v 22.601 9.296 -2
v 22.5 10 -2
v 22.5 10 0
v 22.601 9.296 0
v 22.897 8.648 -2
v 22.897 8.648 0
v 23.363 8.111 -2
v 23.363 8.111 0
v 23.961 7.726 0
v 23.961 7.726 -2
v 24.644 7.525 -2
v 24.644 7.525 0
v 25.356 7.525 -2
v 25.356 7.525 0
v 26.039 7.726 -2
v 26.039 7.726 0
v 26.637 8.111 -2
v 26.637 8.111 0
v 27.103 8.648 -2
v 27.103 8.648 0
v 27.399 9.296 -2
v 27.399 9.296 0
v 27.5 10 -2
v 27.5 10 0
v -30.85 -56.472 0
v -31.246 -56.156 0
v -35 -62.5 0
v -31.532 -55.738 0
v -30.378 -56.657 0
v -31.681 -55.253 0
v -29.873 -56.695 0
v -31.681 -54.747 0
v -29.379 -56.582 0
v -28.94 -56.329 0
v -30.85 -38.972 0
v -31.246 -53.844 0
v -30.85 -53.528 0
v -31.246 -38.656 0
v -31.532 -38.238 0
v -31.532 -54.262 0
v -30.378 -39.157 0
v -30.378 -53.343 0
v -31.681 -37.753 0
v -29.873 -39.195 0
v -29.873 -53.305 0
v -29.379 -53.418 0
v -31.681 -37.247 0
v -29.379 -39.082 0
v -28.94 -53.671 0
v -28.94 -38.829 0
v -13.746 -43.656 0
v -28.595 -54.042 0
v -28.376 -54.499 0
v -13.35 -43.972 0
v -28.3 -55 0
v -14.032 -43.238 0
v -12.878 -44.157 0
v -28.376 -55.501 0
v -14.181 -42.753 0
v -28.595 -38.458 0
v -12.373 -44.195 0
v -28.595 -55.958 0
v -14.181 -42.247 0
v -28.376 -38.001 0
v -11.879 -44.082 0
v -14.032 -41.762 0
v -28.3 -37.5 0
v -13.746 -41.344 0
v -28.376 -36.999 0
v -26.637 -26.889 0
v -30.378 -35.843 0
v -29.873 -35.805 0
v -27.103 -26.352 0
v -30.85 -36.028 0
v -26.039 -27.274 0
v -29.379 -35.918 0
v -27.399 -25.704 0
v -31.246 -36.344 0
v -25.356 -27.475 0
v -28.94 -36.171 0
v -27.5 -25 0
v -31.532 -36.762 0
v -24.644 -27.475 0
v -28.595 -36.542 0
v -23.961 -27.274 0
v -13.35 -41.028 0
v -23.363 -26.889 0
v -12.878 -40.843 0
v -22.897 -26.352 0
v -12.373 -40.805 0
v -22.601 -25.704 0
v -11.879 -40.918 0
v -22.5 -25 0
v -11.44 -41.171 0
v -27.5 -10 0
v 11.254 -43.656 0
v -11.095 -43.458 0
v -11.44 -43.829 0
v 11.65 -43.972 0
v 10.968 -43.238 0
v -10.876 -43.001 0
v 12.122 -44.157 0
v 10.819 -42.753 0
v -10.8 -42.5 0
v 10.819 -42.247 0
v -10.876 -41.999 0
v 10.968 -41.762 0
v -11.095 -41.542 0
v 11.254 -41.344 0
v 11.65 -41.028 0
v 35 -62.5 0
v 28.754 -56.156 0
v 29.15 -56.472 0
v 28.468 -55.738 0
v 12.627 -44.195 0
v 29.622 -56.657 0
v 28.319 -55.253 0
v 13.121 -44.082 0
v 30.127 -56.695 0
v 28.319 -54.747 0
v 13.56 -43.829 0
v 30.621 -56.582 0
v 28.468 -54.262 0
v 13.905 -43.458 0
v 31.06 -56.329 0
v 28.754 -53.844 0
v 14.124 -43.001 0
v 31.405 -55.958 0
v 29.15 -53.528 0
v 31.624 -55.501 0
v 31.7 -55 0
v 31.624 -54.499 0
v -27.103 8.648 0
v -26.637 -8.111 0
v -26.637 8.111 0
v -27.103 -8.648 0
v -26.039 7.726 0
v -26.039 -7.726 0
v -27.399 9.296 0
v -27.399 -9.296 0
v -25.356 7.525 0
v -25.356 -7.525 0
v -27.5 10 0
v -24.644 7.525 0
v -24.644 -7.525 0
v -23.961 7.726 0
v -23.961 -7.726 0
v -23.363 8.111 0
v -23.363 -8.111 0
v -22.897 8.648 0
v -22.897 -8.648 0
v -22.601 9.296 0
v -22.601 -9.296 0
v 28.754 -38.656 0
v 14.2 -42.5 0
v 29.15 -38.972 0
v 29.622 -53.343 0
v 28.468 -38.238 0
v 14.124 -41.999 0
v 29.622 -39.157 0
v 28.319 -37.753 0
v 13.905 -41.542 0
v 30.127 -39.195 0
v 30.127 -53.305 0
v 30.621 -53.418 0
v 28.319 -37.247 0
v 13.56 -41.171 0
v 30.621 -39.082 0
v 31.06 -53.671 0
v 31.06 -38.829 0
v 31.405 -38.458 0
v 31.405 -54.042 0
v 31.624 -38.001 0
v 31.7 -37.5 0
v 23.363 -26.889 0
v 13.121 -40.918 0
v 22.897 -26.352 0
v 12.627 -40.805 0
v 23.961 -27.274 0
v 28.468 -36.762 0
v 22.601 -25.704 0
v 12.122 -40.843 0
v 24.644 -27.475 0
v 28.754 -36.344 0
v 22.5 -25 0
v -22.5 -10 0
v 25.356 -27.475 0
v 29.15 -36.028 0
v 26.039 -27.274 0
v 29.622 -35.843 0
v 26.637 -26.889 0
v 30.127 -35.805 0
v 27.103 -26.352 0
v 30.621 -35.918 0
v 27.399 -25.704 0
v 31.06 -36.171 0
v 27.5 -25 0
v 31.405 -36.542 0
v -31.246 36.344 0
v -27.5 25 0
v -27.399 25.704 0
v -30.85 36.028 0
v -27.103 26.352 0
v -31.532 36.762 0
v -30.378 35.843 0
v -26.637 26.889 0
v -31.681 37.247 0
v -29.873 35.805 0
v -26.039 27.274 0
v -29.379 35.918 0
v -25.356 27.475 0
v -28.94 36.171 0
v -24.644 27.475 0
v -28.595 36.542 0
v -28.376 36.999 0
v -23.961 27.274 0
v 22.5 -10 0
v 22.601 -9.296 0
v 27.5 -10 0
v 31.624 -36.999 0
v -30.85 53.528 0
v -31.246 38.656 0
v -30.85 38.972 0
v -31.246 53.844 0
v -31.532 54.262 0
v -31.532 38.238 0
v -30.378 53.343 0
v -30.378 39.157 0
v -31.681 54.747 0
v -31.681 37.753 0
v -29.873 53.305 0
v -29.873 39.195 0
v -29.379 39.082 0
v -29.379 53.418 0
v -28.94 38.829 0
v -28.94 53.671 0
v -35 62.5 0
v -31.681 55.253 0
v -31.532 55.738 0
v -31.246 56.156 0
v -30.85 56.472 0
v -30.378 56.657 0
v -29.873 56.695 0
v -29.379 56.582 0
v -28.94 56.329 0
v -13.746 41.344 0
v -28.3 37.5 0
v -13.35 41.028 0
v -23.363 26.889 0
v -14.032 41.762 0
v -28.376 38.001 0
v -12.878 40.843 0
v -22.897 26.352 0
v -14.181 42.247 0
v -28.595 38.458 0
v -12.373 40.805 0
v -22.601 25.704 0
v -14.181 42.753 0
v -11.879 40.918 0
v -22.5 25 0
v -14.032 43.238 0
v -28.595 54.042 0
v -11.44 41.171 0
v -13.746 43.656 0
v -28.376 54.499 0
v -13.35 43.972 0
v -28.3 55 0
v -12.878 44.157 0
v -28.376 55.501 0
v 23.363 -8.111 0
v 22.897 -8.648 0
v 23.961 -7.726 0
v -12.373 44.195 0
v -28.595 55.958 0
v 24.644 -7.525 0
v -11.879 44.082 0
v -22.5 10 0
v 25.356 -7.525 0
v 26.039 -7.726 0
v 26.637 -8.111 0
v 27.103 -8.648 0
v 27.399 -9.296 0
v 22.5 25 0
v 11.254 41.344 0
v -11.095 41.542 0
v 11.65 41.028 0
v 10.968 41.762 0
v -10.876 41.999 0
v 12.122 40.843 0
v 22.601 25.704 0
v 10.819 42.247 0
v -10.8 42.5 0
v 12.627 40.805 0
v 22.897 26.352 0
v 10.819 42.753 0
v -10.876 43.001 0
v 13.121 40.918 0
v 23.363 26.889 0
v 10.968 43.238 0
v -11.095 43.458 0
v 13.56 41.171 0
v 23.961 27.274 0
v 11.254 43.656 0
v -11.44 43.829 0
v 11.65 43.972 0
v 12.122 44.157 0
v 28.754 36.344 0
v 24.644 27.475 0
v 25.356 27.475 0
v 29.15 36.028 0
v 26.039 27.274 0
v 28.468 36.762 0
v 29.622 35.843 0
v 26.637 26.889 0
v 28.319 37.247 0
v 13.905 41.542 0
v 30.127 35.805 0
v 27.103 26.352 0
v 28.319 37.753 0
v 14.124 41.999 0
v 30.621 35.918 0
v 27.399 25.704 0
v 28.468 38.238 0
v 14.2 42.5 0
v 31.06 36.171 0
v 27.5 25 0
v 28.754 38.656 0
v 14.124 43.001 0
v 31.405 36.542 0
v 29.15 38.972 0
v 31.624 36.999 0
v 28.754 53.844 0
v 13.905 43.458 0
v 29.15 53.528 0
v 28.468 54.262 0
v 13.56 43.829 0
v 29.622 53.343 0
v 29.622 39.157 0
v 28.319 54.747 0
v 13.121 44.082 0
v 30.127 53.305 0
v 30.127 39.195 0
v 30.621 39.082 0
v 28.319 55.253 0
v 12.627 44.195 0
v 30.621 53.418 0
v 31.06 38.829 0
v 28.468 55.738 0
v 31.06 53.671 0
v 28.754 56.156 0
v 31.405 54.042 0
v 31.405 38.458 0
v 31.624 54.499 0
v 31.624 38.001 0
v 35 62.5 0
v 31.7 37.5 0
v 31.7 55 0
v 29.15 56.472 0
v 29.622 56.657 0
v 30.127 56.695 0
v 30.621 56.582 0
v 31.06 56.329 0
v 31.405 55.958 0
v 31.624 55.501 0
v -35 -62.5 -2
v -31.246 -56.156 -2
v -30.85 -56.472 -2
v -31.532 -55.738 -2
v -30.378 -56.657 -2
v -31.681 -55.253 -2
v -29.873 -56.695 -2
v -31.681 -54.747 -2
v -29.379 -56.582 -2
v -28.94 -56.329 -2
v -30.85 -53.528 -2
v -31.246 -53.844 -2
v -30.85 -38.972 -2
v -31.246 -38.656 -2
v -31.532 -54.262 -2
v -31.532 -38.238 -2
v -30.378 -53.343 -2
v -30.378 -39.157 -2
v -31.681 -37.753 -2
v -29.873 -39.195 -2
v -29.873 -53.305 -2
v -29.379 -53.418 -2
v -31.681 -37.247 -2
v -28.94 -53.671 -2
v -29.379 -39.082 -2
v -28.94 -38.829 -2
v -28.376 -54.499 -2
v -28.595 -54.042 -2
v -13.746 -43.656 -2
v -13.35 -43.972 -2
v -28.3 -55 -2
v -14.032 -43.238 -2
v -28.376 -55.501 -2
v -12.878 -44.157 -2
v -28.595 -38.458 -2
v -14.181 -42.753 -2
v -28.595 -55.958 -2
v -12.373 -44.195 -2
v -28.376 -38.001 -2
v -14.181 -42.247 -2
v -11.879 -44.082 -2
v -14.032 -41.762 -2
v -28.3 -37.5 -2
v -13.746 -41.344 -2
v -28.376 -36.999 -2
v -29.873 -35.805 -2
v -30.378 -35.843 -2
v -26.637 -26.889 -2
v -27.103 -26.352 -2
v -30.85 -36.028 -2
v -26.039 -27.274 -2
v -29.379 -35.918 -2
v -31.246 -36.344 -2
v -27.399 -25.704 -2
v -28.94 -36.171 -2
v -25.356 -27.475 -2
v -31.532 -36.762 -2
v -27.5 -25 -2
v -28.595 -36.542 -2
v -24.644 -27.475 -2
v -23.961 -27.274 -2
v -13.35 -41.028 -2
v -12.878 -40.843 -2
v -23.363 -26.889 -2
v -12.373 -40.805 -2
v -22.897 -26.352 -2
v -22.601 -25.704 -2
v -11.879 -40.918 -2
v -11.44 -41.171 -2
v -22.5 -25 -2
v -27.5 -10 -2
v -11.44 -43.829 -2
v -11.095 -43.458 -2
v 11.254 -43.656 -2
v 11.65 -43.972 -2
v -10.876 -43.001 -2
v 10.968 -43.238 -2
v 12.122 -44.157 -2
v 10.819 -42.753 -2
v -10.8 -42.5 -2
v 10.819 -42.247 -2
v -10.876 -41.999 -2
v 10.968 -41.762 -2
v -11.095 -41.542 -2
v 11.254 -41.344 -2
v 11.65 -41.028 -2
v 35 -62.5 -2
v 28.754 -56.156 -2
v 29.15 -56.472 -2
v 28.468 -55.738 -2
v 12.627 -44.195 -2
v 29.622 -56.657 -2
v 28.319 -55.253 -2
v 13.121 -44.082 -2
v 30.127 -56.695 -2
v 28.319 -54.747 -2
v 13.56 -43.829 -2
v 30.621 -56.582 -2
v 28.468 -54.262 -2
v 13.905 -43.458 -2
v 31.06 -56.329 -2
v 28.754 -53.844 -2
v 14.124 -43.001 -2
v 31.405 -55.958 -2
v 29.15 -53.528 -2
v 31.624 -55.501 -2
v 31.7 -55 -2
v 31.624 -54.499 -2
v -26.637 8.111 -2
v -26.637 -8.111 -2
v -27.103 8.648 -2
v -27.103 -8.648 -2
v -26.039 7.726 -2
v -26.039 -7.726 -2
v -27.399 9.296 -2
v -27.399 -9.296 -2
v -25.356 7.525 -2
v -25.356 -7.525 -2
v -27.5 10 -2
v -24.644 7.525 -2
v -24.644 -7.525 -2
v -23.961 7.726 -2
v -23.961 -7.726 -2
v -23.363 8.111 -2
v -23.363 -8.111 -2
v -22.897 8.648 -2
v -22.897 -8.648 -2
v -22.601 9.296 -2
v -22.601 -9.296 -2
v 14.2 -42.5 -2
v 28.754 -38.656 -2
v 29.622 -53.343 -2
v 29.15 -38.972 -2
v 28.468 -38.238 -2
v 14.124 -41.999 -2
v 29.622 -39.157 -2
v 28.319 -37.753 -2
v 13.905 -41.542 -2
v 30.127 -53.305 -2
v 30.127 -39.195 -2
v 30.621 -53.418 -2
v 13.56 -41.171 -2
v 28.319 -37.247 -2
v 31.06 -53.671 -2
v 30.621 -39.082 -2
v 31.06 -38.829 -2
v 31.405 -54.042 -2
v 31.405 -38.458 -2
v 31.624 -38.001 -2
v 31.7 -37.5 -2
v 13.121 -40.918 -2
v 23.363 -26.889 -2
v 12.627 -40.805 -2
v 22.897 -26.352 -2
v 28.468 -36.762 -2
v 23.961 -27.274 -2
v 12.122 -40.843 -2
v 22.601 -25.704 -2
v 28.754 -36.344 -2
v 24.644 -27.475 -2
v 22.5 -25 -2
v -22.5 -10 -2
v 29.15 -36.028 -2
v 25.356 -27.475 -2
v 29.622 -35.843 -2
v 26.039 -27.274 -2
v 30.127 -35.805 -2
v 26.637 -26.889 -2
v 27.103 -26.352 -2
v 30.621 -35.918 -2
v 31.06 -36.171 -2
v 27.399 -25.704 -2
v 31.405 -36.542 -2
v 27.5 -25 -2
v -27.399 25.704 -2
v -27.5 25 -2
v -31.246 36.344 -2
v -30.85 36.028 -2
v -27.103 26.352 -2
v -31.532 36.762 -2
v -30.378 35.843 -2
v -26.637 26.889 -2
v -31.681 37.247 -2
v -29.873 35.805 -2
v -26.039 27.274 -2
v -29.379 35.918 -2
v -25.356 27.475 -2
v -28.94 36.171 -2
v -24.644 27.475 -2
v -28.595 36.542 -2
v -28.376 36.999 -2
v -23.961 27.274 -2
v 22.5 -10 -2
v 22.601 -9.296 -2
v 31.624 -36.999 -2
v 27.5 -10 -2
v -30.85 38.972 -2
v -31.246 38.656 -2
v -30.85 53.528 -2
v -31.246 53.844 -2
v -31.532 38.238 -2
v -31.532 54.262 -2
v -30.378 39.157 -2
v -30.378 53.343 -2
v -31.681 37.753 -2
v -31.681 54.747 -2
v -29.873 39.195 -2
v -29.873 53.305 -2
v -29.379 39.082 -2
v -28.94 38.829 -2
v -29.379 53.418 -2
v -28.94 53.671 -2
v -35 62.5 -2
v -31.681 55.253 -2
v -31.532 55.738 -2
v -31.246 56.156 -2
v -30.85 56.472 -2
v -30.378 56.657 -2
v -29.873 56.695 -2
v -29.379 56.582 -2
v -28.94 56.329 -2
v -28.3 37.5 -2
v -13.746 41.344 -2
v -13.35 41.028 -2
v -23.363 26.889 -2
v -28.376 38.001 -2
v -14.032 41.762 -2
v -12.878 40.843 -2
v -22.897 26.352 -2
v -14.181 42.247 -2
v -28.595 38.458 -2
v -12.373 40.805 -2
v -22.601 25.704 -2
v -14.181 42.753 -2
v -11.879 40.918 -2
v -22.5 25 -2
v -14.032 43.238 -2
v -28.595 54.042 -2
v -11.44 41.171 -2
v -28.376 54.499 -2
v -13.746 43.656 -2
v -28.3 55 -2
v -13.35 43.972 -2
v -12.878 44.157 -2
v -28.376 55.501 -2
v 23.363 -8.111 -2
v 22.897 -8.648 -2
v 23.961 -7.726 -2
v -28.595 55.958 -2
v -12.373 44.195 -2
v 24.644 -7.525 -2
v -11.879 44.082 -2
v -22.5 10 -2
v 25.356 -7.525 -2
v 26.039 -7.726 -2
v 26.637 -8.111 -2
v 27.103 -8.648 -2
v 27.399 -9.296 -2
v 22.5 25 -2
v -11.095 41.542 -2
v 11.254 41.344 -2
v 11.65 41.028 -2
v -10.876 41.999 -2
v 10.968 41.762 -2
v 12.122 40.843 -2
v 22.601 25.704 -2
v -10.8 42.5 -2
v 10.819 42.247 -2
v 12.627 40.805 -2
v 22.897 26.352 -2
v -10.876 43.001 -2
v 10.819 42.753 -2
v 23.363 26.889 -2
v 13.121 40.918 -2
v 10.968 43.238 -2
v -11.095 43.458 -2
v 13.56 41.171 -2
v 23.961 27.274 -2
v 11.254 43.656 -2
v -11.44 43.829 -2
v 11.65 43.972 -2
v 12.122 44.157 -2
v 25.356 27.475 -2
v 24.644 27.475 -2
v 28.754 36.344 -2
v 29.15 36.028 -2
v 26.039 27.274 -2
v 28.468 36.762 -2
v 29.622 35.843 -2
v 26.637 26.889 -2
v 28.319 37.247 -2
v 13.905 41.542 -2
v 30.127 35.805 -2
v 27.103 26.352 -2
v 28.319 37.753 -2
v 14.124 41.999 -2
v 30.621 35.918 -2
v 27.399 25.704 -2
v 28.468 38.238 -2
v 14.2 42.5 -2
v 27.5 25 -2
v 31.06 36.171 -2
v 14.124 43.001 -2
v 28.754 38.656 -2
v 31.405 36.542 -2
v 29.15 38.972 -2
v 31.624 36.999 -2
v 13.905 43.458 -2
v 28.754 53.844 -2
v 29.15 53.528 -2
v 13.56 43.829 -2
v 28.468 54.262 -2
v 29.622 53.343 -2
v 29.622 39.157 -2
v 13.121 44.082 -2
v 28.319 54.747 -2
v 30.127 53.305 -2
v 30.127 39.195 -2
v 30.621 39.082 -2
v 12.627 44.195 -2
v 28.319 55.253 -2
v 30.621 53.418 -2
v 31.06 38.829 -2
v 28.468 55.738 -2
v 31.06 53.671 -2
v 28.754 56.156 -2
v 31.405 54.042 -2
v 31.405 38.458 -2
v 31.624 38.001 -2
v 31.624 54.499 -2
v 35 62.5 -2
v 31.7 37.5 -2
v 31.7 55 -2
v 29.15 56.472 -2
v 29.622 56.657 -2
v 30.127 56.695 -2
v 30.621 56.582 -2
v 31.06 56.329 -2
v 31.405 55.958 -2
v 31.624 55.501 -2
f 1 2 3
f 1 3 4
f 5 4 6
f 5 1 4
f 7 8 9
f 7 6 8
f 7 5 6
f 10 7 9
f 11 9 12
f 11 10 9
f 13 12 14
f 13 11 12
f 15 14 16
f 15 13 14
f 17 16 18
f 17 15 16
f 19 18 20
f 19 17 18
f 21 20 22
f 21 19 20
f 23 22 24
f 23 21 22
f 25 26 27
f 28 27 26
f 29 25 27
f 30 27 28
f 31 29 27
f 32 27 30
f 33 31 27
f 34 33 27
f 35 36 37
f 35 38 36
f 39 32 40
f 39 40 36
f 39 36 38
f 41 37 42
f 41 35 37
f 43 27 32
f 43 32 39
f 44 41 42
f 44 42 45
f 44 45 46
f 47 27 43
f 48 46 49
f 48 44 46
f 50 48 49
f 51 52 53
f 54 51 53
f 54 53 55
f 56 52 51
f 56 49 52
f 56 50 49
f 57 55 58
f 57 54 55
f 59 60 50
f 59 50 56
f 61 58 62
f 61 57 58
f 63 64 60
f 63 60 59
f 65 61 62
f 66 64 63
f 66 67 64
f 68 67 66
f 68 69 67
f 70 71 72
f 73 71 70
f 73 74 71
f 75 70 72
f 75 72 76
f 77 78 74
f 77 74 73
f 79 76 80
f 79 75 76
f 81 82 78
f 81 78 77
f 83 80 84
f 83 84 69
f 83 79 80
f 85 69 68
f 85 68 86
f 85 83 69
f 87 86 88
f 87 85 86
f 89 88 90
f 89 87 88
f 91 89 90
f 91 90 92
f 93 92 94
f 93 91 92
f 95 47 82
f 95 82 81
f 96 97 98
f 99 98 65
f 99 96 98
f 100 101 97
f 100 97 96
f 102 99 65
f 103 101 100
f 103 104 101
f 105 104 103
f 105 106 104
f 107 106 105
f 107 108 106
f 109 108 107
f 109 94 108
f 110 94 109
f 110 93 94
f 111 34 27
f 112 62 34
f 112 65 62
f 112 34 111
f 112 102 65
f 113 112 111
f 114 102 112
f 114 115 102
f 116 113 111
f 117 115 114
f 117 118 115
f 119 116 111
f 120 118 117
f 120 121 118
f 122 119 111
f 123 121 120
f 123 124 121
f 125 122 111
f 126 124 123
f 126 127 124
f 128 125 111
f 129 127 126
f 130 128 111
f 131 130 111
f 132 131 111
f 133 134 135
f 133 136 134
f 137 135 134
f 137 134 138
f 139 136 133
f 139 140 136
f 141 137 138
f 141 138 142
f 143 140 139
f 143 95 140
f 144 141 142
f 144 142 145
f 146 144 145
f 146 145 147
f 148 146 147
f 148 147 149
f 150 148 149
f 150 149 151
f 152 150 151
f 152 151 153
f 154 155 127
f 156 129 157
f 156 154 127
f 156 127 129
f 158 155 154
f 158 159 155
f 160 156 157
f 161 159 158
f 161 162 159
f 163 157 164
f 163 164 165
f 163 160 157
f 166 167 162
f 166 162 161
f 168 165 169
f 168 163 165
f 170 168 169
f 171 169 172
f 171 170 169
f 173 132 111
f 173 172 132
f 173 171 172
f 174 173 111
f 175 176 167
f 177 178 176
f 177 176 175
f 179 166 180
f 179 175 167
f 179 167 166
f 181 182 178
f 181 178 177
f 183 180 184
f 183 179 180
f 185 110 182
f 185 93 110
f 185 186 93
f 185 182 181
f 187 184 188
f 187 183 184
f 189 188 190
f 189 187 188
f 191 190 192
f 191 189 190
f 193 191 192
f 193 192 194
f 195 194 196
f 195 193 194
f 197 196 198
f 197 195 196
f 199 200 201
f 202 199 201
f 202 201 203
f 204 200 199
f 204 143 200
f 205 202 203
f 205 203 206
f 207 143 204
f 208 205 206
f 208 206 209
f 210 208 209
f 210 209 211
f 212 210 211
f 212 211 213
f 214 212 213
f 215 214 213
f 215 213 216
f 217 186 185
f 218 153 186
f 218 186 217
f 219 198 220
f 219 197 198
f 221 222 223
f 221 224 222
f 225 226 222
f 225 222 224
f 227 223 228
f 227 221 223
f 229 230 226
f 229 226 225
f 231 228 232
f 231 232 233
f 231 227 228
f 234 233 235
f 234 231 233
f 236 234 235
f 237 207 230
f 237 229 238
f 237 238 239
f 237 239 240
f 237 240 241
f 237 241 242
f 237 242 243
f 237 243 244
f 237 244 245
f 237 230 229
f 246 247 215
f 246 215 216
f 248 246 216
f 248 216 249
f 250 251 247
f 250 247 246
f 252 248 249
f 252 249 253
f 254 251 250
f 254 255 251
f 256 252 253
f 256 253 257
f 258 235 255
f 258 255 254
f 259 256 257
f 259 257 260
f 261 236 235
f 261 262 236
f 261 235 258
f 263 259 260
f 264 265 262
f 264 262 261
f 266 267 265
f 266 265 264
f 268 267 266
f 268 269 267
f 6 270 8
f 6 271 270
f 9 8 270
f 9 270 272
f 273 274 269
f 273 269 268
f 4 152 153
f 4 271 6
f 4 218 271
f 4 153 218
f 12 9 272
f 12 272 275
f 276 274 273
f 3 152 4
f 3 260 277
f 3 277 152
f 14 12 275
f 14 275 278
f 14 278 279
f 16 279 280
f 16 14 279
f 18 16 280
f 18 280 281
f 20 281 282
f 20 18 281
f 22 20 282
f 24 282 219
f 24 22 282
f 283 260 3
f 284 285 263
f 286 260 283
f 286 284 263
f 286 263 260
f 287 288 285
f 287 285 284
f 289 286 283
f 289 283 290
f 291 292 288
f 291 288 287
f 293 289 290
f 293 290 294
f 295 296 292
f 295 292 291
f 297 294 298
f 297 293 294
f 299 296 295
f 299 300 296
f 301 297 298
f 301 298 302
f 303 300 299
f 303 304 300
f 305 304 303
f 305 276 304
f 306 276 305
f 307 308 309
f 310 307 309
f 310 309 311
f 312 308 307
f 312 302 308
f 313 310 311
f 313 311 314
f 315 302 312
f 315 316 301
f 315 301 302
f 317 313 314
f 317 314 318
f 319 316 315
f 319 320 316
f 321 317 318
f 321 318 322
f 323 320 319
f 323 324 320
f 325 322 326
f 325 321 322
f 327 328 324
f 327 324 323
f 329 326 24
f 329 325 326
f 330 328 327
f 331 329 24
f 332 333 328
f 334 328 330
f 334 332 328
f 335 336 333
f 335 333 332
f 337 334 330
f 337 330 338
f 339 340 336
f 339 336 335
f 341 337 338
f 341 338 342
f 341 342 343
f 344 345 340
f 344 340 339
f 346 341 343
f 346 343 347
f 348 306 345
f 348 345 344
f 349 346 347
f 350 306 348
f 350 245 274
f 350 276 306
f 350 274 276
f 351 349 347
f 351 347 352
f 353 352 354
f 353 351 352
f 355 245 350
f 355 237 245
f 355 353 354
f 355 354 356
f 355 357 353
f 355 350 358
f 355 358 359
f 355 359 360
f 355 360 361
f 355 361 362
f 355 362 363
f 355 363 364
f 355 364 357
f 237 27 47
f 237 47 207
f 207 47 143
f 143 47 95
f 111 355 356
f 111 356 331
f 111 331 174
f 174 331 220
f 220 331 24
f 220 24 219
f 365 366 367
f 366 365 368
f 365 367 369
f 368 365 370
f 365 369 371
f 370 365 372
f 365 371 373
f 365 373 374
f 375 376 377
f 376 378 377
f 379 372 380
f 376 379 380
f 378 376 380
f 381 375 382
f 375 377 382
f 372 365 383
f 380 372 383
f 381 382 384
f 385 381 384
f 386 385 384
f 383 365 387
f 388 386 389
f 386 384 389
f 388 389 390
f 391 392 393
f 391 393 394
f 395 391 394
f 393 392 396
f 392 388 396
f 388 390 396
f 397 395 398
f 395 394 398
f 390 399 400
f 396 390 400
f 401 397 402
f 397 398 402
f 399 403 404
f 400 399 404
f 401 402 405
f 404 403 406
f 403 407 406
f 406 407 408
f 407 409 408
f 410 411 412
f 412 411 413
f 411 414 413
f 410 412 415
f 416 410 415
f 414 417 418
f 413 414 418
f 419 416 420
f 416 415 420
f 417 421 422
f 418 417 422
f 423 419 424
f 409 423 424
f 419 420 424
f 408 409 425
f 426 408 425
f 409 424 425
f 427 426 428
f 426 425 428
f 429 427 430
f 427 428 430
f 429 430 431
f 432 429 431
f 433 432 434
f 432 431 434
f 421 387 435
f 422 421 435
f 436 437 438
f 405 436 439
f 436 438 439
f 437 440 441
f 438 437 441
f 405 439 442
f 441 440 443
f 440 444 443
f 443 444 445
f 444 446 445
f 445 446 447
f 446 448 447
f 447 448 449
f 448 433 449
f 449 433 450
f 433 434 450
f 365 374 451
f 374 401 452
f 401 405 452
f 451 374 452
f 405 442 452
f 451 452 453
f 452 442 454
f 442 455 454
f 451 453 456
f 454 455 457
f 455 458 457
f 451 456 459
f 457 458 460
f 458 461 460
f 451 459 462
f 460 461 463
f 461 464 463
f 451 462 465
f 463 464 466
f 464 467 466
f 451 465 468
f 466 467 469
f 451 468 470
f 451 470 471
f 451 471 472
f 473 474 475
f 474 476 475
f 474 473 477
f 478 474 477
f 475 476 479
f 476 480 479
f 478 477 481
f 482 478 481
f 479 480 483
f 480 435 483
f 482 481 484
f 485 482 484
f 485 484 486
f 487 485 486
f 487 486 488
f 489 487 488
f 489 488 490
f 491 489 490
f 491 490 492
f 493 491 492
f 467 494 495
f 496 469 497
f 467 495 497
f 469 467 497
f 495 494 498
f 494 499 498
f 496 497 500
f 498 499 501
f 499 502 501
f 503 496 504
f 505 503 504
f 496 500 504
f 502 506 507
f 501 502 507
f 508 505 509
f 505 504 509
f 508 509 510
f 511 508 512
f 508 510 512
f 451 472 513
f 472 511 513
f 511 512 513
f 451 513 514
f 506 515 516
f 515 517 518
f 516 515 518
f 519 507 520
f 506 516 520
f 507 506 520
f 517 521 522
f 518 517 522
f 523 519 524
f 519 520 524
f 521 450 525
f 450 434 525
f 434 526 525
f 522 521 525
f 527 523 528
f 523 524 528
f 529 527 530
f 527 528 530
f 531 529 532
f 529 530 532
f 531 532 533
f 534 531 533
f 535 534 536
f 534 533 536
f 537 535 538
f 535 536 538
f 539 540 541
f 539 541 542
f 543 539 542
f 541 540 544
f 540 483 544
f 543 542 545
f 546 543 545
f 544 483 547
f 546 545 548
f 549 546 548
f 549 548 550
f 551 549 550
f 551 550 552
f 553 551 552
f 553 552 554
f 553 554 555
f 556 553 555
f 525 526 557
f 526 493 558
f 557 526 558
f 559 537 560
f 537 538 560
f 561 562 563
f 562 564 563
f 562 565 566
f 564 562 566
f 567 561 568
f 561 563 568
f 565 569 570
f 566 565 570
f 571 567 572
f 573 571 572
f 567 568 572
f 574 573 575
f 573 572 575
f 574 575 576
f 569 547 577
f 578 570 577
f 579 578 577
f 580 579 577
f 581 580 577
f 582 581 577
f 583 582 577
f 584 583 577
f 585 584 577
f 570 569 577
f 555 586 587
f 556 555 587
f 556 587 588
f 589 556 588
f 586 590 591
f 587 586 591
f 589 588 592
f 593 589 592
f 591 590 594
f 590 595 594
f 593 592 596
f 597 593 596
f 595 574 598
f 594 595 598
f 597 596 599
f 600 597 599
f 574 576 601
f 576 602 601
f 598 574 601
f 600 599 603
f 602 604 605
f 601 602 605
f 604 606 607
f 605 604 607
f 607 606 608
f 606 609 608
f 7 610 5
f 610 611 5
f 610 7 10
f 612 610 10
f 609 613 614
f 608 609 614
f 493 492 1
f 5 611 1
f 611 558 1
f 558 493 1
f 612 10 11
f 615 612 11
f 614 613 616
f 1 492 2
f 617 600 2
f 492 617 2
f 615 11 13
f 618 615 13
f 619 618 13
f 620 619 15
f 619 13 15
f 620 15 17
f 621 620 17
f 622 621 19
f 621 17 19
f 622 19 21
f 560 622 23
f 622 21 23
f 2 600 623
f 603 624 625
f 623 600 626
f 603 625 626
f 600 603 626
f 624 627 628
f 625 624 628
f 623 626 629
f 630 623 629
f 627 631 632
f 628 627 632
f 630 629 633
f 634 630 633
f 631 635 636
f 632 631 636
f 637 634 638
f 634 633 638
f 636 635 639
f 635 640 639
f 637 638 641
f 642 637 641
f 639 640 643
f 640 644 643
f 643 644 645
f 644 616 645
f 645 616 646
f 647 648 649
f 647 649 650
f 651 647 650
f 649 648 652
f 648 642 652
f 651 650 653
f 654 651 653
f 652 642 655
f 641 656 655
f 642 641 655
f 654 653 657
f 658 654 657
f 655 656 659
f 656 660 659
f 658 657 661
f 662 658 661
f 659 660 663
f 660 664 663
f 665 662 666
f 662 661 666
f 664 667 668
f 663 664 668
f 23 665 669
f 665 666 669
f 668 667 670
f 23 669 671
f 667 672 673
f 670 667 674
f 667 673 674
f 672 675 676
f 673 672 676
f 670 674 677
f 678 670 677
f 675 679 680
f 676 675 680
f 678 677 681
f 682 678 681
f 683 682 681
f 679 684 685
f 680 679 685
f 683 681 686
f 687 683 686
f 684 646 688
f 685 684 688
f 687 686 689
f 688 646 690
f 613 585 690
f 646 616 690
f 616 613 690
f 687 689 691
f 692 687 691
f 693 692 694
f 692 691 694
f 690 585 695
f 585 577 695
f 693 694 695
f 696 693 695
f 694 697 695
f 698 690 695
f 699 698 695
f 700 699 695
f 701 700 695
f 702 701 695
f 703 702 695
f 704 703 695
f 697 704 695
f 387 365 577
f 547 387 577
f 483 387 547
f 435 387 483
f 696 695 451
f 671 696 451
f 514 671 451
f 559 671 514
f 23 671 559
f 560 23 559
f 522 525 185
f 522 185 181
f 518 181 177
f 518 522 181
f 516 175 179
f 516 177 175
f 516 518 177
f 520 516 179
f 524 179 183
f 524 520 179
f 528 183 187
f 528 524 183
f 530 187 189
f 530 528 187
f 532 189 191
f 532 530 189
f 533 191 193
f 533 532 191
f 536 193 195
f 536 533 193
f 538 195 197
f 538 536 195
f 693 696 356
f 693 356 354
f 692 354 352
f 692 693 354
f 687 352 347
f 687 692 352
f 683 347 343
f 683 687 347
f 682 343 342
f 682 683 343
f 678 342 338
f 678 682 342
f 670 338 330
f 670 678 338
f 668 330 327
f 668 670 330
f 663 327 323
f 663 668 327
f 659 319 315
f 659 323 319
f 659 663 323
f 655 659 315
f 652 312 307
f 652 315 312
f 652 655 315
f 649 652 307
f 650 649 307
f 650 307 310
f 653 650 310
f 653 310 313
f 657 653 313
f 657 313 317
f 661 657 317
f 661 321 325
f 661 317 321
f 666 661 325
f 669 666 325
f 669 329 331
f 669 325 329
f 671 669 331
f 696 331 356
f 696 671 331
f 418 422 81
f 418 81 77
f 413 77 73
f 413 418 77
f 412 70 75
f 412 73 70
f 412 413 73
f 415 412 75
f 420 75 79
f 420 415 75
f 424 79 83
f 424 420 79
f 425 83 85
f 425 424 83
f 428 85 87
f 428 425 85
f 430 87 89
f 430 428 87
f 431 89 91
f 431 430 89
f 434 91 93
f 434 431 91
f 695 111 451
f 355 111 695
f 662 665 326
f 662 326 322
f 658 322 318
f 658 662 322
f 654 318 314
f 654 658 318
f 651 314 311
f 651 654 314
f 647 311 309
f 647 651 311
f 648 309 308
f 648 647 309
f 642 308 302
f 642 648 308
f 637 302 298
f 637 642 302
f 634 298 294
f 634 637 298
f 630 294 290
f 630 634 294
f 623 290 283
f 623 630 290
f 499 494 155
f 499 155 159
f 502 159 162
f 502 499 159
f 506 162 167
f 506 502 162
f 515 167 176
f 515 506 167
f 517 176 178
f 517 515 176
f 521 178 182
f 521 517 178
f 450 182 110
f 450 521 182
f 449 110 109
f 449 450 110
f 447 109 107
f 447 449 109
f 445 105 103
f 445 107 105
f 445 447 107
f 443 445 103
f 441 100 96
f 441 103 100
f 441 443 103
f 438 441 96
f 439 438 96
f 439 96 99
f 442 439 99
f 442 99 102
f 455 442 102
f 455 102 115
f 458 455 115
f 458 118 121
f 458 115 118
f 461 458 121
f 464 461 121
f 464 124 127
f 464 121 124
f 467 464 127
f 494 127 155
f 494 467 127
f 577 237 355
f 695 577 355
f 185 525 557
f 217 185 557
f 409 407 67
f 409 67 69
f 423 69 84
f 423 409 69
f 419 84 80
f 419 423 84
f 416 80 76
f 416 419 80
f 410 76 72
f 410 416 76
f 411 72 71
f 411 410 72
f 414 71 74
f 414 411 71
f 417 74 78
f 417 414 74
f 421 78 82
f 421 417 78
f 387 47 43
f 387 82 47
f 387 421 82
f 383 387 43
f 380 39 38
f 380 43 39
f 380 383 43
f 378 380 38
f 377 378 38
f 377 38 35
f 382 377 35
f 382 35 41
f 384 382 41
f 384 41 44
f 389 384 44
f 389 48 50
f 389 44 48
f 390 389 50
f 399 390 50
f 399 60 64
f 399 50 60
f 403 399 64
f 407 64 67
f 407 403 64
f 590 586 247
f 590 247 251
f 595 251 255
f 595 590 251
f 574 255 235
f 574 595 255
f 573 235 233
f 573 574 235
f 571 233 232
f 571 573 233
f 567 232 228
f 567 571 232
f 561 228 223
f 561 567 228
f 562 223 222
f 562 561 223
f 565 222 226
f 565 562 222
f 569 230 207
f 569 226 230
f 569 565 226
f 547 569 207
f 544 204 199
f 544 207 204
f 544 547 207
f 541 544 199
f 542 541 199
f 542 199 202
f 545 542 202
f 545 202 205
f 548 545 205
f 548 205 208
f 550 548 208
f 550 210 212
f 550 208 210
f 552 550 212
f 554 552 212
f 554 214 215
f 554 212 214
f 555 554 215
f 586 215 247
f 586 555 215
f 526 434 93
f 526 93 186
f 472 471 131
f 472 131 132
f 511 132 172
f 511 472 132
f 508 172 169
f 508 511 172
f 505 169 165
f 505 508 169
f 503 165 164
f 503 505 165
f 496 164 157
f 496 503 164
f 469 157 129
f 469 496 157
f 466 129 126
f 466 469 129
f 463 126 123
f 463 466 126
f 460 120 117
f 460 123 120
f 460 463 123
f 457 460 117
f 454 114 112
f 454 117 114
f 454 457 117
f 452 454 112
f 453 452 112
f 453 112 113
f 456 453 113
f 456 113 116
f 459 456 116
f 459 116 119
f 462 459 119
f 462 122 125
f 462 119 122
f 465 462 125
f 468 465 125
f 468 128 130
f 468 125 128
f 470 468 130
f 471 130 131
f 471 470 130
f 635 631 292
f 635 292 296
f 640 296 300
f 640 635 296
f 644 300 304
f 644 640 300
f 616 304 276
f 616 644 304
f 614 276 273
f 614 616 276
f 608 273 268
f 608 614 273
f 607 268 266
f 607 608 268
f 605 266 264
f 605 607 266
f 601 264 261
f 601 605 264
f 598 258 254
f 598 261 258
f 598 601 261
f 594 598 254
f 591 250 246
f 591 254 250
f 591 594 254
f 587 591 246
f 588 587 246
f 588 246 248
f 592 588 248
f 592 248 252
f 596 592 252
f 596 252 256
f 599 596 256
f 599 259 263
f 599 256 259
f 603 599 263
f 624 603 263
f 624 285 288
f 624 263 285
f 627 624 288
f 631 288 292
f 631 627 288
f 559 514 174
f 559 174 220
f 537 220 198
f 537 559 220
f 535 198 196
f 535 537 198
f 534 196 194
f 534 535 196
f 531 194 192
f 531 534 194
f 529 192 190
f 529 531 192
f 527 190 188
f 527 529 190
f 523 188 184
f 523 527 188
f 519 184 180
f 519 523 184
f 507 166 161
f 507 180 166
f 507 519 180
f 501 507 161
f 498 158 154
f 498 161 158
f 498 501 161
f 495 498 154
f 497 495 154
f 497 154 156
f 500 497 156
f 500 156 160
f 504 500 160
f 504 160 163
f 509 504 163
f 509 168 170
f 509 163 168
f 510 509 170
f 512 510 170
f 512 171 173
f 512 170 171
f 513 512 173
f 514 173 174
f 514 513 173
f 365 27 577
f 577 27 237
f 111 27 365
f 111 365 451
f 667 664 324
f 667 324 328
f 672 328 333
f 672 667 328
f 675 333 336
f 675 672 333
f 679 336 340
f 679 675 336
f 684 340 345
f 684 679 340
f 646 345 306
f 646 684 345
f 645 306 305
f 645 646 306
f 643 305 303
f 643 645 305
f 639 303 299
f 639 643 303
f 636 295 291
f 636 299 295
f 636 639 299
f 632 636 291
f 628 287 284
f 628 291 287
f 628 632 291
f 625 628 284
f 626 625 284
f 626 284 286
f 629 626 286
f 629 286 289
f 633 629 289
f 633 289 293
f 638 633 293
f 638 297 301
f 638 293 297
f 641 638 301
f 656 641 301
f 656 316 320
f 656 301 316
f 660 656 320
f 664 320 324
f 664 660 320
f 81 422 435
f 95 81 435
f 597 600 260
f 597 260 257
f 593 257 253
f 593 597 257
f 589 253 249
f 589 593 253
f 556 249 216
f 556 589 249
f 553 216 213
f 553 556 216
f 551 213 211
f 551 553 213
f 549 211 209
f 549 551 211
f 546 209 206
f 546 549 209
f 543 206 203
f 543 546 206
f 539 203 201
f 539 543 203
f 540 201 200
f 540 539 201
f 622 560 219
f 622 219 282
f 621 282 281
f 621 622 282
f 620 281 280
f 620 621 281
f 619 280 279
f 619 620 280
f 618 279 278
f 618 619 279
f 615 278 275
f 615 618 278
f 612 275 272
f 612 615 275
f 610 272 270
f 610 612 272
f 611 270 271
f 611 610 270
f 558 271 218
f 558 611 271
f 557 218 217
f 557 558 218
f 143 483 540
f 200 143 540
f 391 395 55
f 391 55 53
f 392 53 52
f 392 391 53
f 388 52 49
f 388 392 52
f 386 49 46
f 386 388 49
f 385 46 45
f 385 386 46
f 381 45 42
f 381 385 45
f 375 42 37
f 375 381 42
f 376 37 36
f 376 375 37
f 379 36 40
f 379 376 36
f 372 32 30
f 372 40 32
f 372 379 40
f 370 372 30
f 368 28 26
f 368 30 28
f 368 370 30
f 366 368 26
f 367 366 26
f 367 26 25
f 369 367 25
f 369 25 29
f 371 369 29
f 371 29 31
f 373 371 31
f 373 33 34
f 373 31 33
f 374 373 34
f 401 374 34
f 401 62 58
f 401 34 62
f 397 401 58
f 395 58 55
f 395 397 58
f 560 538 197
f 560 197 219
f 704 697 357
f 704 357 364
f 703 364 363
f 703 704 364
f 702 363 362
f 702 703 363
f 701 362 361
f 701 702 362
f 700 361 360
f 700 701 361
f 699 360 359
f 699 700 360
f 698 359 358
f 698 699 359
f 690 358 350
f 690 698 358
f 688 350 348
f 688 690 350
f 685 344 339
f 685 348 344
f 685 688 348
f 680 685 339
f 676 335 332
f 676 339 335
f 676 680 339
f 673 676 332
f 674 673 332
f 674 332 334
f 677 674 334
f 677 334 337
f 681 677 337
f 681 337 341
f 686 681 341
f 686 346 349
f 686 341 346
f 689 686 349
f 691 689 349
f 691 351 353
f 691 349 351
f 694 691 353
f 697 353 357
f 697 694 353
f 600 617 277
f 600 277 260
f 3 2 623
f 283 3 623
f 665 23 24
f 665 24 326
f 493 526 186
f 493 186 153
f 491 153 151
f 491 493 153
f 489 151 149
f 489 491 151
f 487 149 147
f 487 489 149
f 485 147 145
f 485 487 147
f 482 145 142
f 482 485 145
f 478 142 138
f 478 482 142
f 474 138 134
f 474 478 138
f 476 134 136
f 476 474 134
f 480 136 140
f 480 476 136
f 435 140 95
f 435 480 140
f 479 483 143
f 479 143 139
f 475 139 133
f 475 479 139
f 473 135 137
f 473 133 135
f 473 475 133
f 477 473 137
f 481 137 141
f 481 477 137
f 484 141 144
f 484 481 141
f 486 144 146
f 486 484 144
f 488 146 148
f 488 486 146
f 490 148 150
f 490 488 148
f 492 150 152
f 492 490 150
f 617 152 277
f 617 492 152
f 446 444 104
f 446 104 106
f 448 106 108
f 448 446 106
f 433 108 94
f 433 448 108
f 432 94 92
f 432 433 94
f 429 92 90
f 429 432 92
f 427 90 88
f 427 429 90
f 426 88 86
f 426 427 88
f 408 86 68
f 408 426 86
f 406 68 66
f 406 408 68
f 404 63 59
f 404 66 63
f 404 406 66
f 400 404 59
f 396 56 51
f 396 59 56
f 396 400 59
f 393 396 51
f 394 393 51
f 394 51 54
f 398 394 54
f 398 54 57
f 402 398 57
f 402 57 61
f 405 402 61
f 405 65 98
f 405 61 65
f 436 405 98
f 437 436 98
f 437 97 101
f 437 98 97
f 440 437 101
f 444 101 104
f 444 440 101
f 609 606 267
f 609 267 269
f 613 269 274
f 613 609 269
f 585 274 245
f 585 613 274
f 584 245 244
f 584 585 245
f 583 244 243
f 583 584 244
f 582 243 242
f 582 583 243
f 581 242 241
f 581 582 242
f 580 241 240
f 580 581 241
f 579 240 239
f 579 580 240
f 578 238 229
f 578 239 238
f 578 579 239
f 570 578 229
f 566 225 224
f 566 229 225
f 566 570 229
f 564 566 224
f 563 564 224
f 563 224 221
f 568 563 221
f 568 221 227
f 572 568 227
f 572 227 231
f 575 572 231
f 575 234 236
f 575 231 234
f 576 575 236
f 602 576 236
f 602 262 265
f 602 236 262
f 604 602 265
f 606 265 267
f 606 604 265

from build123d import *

# Parameters (mm, degrees)
SKETCH1_W                   = 70
SKETCH1_H                   = 125
BOSS_EXTRUDE1_DEPTH         = 2
LO_XUYEN_M3_D3_4_DEPTH      = 72.660658663
LO_XUYEN_M3_D3_4_DEPTH_BACK = 72.660658663
SKETCH2_R                   = 1.7
THAN_RANH_DEPTH             = 72.660658663
THAN_RANH_DEPTH_BACK        = 72.660658663
SKETCH3_W                   = 5
SKETCH3_H                   = 15
DAU_RANH_R2_5_DEPTH         = 72.660658663
DAU_RANH_R2_5_DEPTH_BACK    = 72.660658663
SKETCH4_R                   = 2.5


with BuildPart() as part:
    # Sketch1 → Boss-Extrude1 (new body)
    with BuildSketch(Plane.XY):
        Rectangle(SKETCH1_W, SKETCH1_H)
    extrude(amount=-BOSS_EXTRUDE1_DEPTH)

    # Sketch2 → Lo_xuyen_M3_D3_4 (cut, two sides: drawn at the far end of the back side and taken through both)
    with BuildSketch(Plane.XY.offset(-LO_XUYEN_M3_D3_4_DEPTH_BACK)):
        with Locations((-30, -55)):
            Circle(SKETCH2_R)
        with Locations((-30, -37.5)):
            Circle(SKETCH2_R)
        with Locations((-30, 37.5)):
            Circle(SKETCH2_R)
        with Locations((-30, 55)):
            Circle(SKETCH2_R)
        with Locations((30, -55)):
            Circle(SKETCH2_R)
        with Locations((30, -37.5)):
            Circle(SKETCH2_R)
        with Locations((30, 37.5)):
            Circle(SKETCH2_R)
        with Locations((30, 55)):
            Circle(SKETCH2_R)
        with Locations((-12.5, -42.5)):
            Circle(SKETCH2_R)
        with Locations((-12.5, 42.5)):
            Circle(SKETCH2_R)
        with Locations((12.5, -42.5)):
            Circle(SKETCH2_R)
        with Locations((12.5, 42.5)):
            Circle(SKETCH2_R)
    extrude(amount=LO_XUYEN_M3_D3_4_DEPTH + LO_XUYEN_M3_D3_4_DEPTH_BACK, mode=Mode.SUBTRACT)

    # Sketch3 → Than_ranh (cut, two sides: drawn at the far end of the back side and taken through both)
    with BuildSketch(Plane.XY.offset(-THAN_RANH_DEPTH_BACK)):
        with Locations((-25, -17.5)):
            Rectangle(SKETCH3_W, SKETCH3_H)
        with Locations((-25, 17.5)):
            Rectangle(SKETCH3_W, SKETCH3_H)
        with Locations((25, -17.5)):
            Rectangle(SKETCH3_W, SKETCH3_H)
        with Locations((25, 17.5)):
            Rectangle(SKETCH3_W, SKETCH3_H)
    extrude(amount=THAN_RANH_DEPTH + THAN_RANH_DEPTH_BACK, mode=Mode.SUBTRACT)

    # Sketch4 → Dau_ranh_R2_5 (cut, two sides: drawn at the far end of the back side and taken through both)
    with BuildSketch(Plane.XY.offset(-DAU_RANH_R2_5_DEPTH_BACK)):
        with Locations((-25, -25)):
            Circle(SKETCH4_R)
        with Locations((-25, -10)):
            Circle(SKETCH4_R)
        with Locations((-25, 10)):
            Circle(SKETCH4_R)
        with Locations((-25, 25)):
            Circle(SKETCH4_R)
        with Locations((25, -25)):
            Circle(SKETCH4_R)
        with Locations((25, -10)):
            Circle(SKETCH4_R)
        with Locations((25, 10)):
            Circle(SKETCH4_R)
        with Locations((25, 25)):
            Circle(SKETCH4_R)
    extrude(amount=DAU_RANH_R2_5_DEPTH + DAU_RANH_R2_5_DEPTH_BACK, mode=Mode.SUBTRACT)


solid = part.part
